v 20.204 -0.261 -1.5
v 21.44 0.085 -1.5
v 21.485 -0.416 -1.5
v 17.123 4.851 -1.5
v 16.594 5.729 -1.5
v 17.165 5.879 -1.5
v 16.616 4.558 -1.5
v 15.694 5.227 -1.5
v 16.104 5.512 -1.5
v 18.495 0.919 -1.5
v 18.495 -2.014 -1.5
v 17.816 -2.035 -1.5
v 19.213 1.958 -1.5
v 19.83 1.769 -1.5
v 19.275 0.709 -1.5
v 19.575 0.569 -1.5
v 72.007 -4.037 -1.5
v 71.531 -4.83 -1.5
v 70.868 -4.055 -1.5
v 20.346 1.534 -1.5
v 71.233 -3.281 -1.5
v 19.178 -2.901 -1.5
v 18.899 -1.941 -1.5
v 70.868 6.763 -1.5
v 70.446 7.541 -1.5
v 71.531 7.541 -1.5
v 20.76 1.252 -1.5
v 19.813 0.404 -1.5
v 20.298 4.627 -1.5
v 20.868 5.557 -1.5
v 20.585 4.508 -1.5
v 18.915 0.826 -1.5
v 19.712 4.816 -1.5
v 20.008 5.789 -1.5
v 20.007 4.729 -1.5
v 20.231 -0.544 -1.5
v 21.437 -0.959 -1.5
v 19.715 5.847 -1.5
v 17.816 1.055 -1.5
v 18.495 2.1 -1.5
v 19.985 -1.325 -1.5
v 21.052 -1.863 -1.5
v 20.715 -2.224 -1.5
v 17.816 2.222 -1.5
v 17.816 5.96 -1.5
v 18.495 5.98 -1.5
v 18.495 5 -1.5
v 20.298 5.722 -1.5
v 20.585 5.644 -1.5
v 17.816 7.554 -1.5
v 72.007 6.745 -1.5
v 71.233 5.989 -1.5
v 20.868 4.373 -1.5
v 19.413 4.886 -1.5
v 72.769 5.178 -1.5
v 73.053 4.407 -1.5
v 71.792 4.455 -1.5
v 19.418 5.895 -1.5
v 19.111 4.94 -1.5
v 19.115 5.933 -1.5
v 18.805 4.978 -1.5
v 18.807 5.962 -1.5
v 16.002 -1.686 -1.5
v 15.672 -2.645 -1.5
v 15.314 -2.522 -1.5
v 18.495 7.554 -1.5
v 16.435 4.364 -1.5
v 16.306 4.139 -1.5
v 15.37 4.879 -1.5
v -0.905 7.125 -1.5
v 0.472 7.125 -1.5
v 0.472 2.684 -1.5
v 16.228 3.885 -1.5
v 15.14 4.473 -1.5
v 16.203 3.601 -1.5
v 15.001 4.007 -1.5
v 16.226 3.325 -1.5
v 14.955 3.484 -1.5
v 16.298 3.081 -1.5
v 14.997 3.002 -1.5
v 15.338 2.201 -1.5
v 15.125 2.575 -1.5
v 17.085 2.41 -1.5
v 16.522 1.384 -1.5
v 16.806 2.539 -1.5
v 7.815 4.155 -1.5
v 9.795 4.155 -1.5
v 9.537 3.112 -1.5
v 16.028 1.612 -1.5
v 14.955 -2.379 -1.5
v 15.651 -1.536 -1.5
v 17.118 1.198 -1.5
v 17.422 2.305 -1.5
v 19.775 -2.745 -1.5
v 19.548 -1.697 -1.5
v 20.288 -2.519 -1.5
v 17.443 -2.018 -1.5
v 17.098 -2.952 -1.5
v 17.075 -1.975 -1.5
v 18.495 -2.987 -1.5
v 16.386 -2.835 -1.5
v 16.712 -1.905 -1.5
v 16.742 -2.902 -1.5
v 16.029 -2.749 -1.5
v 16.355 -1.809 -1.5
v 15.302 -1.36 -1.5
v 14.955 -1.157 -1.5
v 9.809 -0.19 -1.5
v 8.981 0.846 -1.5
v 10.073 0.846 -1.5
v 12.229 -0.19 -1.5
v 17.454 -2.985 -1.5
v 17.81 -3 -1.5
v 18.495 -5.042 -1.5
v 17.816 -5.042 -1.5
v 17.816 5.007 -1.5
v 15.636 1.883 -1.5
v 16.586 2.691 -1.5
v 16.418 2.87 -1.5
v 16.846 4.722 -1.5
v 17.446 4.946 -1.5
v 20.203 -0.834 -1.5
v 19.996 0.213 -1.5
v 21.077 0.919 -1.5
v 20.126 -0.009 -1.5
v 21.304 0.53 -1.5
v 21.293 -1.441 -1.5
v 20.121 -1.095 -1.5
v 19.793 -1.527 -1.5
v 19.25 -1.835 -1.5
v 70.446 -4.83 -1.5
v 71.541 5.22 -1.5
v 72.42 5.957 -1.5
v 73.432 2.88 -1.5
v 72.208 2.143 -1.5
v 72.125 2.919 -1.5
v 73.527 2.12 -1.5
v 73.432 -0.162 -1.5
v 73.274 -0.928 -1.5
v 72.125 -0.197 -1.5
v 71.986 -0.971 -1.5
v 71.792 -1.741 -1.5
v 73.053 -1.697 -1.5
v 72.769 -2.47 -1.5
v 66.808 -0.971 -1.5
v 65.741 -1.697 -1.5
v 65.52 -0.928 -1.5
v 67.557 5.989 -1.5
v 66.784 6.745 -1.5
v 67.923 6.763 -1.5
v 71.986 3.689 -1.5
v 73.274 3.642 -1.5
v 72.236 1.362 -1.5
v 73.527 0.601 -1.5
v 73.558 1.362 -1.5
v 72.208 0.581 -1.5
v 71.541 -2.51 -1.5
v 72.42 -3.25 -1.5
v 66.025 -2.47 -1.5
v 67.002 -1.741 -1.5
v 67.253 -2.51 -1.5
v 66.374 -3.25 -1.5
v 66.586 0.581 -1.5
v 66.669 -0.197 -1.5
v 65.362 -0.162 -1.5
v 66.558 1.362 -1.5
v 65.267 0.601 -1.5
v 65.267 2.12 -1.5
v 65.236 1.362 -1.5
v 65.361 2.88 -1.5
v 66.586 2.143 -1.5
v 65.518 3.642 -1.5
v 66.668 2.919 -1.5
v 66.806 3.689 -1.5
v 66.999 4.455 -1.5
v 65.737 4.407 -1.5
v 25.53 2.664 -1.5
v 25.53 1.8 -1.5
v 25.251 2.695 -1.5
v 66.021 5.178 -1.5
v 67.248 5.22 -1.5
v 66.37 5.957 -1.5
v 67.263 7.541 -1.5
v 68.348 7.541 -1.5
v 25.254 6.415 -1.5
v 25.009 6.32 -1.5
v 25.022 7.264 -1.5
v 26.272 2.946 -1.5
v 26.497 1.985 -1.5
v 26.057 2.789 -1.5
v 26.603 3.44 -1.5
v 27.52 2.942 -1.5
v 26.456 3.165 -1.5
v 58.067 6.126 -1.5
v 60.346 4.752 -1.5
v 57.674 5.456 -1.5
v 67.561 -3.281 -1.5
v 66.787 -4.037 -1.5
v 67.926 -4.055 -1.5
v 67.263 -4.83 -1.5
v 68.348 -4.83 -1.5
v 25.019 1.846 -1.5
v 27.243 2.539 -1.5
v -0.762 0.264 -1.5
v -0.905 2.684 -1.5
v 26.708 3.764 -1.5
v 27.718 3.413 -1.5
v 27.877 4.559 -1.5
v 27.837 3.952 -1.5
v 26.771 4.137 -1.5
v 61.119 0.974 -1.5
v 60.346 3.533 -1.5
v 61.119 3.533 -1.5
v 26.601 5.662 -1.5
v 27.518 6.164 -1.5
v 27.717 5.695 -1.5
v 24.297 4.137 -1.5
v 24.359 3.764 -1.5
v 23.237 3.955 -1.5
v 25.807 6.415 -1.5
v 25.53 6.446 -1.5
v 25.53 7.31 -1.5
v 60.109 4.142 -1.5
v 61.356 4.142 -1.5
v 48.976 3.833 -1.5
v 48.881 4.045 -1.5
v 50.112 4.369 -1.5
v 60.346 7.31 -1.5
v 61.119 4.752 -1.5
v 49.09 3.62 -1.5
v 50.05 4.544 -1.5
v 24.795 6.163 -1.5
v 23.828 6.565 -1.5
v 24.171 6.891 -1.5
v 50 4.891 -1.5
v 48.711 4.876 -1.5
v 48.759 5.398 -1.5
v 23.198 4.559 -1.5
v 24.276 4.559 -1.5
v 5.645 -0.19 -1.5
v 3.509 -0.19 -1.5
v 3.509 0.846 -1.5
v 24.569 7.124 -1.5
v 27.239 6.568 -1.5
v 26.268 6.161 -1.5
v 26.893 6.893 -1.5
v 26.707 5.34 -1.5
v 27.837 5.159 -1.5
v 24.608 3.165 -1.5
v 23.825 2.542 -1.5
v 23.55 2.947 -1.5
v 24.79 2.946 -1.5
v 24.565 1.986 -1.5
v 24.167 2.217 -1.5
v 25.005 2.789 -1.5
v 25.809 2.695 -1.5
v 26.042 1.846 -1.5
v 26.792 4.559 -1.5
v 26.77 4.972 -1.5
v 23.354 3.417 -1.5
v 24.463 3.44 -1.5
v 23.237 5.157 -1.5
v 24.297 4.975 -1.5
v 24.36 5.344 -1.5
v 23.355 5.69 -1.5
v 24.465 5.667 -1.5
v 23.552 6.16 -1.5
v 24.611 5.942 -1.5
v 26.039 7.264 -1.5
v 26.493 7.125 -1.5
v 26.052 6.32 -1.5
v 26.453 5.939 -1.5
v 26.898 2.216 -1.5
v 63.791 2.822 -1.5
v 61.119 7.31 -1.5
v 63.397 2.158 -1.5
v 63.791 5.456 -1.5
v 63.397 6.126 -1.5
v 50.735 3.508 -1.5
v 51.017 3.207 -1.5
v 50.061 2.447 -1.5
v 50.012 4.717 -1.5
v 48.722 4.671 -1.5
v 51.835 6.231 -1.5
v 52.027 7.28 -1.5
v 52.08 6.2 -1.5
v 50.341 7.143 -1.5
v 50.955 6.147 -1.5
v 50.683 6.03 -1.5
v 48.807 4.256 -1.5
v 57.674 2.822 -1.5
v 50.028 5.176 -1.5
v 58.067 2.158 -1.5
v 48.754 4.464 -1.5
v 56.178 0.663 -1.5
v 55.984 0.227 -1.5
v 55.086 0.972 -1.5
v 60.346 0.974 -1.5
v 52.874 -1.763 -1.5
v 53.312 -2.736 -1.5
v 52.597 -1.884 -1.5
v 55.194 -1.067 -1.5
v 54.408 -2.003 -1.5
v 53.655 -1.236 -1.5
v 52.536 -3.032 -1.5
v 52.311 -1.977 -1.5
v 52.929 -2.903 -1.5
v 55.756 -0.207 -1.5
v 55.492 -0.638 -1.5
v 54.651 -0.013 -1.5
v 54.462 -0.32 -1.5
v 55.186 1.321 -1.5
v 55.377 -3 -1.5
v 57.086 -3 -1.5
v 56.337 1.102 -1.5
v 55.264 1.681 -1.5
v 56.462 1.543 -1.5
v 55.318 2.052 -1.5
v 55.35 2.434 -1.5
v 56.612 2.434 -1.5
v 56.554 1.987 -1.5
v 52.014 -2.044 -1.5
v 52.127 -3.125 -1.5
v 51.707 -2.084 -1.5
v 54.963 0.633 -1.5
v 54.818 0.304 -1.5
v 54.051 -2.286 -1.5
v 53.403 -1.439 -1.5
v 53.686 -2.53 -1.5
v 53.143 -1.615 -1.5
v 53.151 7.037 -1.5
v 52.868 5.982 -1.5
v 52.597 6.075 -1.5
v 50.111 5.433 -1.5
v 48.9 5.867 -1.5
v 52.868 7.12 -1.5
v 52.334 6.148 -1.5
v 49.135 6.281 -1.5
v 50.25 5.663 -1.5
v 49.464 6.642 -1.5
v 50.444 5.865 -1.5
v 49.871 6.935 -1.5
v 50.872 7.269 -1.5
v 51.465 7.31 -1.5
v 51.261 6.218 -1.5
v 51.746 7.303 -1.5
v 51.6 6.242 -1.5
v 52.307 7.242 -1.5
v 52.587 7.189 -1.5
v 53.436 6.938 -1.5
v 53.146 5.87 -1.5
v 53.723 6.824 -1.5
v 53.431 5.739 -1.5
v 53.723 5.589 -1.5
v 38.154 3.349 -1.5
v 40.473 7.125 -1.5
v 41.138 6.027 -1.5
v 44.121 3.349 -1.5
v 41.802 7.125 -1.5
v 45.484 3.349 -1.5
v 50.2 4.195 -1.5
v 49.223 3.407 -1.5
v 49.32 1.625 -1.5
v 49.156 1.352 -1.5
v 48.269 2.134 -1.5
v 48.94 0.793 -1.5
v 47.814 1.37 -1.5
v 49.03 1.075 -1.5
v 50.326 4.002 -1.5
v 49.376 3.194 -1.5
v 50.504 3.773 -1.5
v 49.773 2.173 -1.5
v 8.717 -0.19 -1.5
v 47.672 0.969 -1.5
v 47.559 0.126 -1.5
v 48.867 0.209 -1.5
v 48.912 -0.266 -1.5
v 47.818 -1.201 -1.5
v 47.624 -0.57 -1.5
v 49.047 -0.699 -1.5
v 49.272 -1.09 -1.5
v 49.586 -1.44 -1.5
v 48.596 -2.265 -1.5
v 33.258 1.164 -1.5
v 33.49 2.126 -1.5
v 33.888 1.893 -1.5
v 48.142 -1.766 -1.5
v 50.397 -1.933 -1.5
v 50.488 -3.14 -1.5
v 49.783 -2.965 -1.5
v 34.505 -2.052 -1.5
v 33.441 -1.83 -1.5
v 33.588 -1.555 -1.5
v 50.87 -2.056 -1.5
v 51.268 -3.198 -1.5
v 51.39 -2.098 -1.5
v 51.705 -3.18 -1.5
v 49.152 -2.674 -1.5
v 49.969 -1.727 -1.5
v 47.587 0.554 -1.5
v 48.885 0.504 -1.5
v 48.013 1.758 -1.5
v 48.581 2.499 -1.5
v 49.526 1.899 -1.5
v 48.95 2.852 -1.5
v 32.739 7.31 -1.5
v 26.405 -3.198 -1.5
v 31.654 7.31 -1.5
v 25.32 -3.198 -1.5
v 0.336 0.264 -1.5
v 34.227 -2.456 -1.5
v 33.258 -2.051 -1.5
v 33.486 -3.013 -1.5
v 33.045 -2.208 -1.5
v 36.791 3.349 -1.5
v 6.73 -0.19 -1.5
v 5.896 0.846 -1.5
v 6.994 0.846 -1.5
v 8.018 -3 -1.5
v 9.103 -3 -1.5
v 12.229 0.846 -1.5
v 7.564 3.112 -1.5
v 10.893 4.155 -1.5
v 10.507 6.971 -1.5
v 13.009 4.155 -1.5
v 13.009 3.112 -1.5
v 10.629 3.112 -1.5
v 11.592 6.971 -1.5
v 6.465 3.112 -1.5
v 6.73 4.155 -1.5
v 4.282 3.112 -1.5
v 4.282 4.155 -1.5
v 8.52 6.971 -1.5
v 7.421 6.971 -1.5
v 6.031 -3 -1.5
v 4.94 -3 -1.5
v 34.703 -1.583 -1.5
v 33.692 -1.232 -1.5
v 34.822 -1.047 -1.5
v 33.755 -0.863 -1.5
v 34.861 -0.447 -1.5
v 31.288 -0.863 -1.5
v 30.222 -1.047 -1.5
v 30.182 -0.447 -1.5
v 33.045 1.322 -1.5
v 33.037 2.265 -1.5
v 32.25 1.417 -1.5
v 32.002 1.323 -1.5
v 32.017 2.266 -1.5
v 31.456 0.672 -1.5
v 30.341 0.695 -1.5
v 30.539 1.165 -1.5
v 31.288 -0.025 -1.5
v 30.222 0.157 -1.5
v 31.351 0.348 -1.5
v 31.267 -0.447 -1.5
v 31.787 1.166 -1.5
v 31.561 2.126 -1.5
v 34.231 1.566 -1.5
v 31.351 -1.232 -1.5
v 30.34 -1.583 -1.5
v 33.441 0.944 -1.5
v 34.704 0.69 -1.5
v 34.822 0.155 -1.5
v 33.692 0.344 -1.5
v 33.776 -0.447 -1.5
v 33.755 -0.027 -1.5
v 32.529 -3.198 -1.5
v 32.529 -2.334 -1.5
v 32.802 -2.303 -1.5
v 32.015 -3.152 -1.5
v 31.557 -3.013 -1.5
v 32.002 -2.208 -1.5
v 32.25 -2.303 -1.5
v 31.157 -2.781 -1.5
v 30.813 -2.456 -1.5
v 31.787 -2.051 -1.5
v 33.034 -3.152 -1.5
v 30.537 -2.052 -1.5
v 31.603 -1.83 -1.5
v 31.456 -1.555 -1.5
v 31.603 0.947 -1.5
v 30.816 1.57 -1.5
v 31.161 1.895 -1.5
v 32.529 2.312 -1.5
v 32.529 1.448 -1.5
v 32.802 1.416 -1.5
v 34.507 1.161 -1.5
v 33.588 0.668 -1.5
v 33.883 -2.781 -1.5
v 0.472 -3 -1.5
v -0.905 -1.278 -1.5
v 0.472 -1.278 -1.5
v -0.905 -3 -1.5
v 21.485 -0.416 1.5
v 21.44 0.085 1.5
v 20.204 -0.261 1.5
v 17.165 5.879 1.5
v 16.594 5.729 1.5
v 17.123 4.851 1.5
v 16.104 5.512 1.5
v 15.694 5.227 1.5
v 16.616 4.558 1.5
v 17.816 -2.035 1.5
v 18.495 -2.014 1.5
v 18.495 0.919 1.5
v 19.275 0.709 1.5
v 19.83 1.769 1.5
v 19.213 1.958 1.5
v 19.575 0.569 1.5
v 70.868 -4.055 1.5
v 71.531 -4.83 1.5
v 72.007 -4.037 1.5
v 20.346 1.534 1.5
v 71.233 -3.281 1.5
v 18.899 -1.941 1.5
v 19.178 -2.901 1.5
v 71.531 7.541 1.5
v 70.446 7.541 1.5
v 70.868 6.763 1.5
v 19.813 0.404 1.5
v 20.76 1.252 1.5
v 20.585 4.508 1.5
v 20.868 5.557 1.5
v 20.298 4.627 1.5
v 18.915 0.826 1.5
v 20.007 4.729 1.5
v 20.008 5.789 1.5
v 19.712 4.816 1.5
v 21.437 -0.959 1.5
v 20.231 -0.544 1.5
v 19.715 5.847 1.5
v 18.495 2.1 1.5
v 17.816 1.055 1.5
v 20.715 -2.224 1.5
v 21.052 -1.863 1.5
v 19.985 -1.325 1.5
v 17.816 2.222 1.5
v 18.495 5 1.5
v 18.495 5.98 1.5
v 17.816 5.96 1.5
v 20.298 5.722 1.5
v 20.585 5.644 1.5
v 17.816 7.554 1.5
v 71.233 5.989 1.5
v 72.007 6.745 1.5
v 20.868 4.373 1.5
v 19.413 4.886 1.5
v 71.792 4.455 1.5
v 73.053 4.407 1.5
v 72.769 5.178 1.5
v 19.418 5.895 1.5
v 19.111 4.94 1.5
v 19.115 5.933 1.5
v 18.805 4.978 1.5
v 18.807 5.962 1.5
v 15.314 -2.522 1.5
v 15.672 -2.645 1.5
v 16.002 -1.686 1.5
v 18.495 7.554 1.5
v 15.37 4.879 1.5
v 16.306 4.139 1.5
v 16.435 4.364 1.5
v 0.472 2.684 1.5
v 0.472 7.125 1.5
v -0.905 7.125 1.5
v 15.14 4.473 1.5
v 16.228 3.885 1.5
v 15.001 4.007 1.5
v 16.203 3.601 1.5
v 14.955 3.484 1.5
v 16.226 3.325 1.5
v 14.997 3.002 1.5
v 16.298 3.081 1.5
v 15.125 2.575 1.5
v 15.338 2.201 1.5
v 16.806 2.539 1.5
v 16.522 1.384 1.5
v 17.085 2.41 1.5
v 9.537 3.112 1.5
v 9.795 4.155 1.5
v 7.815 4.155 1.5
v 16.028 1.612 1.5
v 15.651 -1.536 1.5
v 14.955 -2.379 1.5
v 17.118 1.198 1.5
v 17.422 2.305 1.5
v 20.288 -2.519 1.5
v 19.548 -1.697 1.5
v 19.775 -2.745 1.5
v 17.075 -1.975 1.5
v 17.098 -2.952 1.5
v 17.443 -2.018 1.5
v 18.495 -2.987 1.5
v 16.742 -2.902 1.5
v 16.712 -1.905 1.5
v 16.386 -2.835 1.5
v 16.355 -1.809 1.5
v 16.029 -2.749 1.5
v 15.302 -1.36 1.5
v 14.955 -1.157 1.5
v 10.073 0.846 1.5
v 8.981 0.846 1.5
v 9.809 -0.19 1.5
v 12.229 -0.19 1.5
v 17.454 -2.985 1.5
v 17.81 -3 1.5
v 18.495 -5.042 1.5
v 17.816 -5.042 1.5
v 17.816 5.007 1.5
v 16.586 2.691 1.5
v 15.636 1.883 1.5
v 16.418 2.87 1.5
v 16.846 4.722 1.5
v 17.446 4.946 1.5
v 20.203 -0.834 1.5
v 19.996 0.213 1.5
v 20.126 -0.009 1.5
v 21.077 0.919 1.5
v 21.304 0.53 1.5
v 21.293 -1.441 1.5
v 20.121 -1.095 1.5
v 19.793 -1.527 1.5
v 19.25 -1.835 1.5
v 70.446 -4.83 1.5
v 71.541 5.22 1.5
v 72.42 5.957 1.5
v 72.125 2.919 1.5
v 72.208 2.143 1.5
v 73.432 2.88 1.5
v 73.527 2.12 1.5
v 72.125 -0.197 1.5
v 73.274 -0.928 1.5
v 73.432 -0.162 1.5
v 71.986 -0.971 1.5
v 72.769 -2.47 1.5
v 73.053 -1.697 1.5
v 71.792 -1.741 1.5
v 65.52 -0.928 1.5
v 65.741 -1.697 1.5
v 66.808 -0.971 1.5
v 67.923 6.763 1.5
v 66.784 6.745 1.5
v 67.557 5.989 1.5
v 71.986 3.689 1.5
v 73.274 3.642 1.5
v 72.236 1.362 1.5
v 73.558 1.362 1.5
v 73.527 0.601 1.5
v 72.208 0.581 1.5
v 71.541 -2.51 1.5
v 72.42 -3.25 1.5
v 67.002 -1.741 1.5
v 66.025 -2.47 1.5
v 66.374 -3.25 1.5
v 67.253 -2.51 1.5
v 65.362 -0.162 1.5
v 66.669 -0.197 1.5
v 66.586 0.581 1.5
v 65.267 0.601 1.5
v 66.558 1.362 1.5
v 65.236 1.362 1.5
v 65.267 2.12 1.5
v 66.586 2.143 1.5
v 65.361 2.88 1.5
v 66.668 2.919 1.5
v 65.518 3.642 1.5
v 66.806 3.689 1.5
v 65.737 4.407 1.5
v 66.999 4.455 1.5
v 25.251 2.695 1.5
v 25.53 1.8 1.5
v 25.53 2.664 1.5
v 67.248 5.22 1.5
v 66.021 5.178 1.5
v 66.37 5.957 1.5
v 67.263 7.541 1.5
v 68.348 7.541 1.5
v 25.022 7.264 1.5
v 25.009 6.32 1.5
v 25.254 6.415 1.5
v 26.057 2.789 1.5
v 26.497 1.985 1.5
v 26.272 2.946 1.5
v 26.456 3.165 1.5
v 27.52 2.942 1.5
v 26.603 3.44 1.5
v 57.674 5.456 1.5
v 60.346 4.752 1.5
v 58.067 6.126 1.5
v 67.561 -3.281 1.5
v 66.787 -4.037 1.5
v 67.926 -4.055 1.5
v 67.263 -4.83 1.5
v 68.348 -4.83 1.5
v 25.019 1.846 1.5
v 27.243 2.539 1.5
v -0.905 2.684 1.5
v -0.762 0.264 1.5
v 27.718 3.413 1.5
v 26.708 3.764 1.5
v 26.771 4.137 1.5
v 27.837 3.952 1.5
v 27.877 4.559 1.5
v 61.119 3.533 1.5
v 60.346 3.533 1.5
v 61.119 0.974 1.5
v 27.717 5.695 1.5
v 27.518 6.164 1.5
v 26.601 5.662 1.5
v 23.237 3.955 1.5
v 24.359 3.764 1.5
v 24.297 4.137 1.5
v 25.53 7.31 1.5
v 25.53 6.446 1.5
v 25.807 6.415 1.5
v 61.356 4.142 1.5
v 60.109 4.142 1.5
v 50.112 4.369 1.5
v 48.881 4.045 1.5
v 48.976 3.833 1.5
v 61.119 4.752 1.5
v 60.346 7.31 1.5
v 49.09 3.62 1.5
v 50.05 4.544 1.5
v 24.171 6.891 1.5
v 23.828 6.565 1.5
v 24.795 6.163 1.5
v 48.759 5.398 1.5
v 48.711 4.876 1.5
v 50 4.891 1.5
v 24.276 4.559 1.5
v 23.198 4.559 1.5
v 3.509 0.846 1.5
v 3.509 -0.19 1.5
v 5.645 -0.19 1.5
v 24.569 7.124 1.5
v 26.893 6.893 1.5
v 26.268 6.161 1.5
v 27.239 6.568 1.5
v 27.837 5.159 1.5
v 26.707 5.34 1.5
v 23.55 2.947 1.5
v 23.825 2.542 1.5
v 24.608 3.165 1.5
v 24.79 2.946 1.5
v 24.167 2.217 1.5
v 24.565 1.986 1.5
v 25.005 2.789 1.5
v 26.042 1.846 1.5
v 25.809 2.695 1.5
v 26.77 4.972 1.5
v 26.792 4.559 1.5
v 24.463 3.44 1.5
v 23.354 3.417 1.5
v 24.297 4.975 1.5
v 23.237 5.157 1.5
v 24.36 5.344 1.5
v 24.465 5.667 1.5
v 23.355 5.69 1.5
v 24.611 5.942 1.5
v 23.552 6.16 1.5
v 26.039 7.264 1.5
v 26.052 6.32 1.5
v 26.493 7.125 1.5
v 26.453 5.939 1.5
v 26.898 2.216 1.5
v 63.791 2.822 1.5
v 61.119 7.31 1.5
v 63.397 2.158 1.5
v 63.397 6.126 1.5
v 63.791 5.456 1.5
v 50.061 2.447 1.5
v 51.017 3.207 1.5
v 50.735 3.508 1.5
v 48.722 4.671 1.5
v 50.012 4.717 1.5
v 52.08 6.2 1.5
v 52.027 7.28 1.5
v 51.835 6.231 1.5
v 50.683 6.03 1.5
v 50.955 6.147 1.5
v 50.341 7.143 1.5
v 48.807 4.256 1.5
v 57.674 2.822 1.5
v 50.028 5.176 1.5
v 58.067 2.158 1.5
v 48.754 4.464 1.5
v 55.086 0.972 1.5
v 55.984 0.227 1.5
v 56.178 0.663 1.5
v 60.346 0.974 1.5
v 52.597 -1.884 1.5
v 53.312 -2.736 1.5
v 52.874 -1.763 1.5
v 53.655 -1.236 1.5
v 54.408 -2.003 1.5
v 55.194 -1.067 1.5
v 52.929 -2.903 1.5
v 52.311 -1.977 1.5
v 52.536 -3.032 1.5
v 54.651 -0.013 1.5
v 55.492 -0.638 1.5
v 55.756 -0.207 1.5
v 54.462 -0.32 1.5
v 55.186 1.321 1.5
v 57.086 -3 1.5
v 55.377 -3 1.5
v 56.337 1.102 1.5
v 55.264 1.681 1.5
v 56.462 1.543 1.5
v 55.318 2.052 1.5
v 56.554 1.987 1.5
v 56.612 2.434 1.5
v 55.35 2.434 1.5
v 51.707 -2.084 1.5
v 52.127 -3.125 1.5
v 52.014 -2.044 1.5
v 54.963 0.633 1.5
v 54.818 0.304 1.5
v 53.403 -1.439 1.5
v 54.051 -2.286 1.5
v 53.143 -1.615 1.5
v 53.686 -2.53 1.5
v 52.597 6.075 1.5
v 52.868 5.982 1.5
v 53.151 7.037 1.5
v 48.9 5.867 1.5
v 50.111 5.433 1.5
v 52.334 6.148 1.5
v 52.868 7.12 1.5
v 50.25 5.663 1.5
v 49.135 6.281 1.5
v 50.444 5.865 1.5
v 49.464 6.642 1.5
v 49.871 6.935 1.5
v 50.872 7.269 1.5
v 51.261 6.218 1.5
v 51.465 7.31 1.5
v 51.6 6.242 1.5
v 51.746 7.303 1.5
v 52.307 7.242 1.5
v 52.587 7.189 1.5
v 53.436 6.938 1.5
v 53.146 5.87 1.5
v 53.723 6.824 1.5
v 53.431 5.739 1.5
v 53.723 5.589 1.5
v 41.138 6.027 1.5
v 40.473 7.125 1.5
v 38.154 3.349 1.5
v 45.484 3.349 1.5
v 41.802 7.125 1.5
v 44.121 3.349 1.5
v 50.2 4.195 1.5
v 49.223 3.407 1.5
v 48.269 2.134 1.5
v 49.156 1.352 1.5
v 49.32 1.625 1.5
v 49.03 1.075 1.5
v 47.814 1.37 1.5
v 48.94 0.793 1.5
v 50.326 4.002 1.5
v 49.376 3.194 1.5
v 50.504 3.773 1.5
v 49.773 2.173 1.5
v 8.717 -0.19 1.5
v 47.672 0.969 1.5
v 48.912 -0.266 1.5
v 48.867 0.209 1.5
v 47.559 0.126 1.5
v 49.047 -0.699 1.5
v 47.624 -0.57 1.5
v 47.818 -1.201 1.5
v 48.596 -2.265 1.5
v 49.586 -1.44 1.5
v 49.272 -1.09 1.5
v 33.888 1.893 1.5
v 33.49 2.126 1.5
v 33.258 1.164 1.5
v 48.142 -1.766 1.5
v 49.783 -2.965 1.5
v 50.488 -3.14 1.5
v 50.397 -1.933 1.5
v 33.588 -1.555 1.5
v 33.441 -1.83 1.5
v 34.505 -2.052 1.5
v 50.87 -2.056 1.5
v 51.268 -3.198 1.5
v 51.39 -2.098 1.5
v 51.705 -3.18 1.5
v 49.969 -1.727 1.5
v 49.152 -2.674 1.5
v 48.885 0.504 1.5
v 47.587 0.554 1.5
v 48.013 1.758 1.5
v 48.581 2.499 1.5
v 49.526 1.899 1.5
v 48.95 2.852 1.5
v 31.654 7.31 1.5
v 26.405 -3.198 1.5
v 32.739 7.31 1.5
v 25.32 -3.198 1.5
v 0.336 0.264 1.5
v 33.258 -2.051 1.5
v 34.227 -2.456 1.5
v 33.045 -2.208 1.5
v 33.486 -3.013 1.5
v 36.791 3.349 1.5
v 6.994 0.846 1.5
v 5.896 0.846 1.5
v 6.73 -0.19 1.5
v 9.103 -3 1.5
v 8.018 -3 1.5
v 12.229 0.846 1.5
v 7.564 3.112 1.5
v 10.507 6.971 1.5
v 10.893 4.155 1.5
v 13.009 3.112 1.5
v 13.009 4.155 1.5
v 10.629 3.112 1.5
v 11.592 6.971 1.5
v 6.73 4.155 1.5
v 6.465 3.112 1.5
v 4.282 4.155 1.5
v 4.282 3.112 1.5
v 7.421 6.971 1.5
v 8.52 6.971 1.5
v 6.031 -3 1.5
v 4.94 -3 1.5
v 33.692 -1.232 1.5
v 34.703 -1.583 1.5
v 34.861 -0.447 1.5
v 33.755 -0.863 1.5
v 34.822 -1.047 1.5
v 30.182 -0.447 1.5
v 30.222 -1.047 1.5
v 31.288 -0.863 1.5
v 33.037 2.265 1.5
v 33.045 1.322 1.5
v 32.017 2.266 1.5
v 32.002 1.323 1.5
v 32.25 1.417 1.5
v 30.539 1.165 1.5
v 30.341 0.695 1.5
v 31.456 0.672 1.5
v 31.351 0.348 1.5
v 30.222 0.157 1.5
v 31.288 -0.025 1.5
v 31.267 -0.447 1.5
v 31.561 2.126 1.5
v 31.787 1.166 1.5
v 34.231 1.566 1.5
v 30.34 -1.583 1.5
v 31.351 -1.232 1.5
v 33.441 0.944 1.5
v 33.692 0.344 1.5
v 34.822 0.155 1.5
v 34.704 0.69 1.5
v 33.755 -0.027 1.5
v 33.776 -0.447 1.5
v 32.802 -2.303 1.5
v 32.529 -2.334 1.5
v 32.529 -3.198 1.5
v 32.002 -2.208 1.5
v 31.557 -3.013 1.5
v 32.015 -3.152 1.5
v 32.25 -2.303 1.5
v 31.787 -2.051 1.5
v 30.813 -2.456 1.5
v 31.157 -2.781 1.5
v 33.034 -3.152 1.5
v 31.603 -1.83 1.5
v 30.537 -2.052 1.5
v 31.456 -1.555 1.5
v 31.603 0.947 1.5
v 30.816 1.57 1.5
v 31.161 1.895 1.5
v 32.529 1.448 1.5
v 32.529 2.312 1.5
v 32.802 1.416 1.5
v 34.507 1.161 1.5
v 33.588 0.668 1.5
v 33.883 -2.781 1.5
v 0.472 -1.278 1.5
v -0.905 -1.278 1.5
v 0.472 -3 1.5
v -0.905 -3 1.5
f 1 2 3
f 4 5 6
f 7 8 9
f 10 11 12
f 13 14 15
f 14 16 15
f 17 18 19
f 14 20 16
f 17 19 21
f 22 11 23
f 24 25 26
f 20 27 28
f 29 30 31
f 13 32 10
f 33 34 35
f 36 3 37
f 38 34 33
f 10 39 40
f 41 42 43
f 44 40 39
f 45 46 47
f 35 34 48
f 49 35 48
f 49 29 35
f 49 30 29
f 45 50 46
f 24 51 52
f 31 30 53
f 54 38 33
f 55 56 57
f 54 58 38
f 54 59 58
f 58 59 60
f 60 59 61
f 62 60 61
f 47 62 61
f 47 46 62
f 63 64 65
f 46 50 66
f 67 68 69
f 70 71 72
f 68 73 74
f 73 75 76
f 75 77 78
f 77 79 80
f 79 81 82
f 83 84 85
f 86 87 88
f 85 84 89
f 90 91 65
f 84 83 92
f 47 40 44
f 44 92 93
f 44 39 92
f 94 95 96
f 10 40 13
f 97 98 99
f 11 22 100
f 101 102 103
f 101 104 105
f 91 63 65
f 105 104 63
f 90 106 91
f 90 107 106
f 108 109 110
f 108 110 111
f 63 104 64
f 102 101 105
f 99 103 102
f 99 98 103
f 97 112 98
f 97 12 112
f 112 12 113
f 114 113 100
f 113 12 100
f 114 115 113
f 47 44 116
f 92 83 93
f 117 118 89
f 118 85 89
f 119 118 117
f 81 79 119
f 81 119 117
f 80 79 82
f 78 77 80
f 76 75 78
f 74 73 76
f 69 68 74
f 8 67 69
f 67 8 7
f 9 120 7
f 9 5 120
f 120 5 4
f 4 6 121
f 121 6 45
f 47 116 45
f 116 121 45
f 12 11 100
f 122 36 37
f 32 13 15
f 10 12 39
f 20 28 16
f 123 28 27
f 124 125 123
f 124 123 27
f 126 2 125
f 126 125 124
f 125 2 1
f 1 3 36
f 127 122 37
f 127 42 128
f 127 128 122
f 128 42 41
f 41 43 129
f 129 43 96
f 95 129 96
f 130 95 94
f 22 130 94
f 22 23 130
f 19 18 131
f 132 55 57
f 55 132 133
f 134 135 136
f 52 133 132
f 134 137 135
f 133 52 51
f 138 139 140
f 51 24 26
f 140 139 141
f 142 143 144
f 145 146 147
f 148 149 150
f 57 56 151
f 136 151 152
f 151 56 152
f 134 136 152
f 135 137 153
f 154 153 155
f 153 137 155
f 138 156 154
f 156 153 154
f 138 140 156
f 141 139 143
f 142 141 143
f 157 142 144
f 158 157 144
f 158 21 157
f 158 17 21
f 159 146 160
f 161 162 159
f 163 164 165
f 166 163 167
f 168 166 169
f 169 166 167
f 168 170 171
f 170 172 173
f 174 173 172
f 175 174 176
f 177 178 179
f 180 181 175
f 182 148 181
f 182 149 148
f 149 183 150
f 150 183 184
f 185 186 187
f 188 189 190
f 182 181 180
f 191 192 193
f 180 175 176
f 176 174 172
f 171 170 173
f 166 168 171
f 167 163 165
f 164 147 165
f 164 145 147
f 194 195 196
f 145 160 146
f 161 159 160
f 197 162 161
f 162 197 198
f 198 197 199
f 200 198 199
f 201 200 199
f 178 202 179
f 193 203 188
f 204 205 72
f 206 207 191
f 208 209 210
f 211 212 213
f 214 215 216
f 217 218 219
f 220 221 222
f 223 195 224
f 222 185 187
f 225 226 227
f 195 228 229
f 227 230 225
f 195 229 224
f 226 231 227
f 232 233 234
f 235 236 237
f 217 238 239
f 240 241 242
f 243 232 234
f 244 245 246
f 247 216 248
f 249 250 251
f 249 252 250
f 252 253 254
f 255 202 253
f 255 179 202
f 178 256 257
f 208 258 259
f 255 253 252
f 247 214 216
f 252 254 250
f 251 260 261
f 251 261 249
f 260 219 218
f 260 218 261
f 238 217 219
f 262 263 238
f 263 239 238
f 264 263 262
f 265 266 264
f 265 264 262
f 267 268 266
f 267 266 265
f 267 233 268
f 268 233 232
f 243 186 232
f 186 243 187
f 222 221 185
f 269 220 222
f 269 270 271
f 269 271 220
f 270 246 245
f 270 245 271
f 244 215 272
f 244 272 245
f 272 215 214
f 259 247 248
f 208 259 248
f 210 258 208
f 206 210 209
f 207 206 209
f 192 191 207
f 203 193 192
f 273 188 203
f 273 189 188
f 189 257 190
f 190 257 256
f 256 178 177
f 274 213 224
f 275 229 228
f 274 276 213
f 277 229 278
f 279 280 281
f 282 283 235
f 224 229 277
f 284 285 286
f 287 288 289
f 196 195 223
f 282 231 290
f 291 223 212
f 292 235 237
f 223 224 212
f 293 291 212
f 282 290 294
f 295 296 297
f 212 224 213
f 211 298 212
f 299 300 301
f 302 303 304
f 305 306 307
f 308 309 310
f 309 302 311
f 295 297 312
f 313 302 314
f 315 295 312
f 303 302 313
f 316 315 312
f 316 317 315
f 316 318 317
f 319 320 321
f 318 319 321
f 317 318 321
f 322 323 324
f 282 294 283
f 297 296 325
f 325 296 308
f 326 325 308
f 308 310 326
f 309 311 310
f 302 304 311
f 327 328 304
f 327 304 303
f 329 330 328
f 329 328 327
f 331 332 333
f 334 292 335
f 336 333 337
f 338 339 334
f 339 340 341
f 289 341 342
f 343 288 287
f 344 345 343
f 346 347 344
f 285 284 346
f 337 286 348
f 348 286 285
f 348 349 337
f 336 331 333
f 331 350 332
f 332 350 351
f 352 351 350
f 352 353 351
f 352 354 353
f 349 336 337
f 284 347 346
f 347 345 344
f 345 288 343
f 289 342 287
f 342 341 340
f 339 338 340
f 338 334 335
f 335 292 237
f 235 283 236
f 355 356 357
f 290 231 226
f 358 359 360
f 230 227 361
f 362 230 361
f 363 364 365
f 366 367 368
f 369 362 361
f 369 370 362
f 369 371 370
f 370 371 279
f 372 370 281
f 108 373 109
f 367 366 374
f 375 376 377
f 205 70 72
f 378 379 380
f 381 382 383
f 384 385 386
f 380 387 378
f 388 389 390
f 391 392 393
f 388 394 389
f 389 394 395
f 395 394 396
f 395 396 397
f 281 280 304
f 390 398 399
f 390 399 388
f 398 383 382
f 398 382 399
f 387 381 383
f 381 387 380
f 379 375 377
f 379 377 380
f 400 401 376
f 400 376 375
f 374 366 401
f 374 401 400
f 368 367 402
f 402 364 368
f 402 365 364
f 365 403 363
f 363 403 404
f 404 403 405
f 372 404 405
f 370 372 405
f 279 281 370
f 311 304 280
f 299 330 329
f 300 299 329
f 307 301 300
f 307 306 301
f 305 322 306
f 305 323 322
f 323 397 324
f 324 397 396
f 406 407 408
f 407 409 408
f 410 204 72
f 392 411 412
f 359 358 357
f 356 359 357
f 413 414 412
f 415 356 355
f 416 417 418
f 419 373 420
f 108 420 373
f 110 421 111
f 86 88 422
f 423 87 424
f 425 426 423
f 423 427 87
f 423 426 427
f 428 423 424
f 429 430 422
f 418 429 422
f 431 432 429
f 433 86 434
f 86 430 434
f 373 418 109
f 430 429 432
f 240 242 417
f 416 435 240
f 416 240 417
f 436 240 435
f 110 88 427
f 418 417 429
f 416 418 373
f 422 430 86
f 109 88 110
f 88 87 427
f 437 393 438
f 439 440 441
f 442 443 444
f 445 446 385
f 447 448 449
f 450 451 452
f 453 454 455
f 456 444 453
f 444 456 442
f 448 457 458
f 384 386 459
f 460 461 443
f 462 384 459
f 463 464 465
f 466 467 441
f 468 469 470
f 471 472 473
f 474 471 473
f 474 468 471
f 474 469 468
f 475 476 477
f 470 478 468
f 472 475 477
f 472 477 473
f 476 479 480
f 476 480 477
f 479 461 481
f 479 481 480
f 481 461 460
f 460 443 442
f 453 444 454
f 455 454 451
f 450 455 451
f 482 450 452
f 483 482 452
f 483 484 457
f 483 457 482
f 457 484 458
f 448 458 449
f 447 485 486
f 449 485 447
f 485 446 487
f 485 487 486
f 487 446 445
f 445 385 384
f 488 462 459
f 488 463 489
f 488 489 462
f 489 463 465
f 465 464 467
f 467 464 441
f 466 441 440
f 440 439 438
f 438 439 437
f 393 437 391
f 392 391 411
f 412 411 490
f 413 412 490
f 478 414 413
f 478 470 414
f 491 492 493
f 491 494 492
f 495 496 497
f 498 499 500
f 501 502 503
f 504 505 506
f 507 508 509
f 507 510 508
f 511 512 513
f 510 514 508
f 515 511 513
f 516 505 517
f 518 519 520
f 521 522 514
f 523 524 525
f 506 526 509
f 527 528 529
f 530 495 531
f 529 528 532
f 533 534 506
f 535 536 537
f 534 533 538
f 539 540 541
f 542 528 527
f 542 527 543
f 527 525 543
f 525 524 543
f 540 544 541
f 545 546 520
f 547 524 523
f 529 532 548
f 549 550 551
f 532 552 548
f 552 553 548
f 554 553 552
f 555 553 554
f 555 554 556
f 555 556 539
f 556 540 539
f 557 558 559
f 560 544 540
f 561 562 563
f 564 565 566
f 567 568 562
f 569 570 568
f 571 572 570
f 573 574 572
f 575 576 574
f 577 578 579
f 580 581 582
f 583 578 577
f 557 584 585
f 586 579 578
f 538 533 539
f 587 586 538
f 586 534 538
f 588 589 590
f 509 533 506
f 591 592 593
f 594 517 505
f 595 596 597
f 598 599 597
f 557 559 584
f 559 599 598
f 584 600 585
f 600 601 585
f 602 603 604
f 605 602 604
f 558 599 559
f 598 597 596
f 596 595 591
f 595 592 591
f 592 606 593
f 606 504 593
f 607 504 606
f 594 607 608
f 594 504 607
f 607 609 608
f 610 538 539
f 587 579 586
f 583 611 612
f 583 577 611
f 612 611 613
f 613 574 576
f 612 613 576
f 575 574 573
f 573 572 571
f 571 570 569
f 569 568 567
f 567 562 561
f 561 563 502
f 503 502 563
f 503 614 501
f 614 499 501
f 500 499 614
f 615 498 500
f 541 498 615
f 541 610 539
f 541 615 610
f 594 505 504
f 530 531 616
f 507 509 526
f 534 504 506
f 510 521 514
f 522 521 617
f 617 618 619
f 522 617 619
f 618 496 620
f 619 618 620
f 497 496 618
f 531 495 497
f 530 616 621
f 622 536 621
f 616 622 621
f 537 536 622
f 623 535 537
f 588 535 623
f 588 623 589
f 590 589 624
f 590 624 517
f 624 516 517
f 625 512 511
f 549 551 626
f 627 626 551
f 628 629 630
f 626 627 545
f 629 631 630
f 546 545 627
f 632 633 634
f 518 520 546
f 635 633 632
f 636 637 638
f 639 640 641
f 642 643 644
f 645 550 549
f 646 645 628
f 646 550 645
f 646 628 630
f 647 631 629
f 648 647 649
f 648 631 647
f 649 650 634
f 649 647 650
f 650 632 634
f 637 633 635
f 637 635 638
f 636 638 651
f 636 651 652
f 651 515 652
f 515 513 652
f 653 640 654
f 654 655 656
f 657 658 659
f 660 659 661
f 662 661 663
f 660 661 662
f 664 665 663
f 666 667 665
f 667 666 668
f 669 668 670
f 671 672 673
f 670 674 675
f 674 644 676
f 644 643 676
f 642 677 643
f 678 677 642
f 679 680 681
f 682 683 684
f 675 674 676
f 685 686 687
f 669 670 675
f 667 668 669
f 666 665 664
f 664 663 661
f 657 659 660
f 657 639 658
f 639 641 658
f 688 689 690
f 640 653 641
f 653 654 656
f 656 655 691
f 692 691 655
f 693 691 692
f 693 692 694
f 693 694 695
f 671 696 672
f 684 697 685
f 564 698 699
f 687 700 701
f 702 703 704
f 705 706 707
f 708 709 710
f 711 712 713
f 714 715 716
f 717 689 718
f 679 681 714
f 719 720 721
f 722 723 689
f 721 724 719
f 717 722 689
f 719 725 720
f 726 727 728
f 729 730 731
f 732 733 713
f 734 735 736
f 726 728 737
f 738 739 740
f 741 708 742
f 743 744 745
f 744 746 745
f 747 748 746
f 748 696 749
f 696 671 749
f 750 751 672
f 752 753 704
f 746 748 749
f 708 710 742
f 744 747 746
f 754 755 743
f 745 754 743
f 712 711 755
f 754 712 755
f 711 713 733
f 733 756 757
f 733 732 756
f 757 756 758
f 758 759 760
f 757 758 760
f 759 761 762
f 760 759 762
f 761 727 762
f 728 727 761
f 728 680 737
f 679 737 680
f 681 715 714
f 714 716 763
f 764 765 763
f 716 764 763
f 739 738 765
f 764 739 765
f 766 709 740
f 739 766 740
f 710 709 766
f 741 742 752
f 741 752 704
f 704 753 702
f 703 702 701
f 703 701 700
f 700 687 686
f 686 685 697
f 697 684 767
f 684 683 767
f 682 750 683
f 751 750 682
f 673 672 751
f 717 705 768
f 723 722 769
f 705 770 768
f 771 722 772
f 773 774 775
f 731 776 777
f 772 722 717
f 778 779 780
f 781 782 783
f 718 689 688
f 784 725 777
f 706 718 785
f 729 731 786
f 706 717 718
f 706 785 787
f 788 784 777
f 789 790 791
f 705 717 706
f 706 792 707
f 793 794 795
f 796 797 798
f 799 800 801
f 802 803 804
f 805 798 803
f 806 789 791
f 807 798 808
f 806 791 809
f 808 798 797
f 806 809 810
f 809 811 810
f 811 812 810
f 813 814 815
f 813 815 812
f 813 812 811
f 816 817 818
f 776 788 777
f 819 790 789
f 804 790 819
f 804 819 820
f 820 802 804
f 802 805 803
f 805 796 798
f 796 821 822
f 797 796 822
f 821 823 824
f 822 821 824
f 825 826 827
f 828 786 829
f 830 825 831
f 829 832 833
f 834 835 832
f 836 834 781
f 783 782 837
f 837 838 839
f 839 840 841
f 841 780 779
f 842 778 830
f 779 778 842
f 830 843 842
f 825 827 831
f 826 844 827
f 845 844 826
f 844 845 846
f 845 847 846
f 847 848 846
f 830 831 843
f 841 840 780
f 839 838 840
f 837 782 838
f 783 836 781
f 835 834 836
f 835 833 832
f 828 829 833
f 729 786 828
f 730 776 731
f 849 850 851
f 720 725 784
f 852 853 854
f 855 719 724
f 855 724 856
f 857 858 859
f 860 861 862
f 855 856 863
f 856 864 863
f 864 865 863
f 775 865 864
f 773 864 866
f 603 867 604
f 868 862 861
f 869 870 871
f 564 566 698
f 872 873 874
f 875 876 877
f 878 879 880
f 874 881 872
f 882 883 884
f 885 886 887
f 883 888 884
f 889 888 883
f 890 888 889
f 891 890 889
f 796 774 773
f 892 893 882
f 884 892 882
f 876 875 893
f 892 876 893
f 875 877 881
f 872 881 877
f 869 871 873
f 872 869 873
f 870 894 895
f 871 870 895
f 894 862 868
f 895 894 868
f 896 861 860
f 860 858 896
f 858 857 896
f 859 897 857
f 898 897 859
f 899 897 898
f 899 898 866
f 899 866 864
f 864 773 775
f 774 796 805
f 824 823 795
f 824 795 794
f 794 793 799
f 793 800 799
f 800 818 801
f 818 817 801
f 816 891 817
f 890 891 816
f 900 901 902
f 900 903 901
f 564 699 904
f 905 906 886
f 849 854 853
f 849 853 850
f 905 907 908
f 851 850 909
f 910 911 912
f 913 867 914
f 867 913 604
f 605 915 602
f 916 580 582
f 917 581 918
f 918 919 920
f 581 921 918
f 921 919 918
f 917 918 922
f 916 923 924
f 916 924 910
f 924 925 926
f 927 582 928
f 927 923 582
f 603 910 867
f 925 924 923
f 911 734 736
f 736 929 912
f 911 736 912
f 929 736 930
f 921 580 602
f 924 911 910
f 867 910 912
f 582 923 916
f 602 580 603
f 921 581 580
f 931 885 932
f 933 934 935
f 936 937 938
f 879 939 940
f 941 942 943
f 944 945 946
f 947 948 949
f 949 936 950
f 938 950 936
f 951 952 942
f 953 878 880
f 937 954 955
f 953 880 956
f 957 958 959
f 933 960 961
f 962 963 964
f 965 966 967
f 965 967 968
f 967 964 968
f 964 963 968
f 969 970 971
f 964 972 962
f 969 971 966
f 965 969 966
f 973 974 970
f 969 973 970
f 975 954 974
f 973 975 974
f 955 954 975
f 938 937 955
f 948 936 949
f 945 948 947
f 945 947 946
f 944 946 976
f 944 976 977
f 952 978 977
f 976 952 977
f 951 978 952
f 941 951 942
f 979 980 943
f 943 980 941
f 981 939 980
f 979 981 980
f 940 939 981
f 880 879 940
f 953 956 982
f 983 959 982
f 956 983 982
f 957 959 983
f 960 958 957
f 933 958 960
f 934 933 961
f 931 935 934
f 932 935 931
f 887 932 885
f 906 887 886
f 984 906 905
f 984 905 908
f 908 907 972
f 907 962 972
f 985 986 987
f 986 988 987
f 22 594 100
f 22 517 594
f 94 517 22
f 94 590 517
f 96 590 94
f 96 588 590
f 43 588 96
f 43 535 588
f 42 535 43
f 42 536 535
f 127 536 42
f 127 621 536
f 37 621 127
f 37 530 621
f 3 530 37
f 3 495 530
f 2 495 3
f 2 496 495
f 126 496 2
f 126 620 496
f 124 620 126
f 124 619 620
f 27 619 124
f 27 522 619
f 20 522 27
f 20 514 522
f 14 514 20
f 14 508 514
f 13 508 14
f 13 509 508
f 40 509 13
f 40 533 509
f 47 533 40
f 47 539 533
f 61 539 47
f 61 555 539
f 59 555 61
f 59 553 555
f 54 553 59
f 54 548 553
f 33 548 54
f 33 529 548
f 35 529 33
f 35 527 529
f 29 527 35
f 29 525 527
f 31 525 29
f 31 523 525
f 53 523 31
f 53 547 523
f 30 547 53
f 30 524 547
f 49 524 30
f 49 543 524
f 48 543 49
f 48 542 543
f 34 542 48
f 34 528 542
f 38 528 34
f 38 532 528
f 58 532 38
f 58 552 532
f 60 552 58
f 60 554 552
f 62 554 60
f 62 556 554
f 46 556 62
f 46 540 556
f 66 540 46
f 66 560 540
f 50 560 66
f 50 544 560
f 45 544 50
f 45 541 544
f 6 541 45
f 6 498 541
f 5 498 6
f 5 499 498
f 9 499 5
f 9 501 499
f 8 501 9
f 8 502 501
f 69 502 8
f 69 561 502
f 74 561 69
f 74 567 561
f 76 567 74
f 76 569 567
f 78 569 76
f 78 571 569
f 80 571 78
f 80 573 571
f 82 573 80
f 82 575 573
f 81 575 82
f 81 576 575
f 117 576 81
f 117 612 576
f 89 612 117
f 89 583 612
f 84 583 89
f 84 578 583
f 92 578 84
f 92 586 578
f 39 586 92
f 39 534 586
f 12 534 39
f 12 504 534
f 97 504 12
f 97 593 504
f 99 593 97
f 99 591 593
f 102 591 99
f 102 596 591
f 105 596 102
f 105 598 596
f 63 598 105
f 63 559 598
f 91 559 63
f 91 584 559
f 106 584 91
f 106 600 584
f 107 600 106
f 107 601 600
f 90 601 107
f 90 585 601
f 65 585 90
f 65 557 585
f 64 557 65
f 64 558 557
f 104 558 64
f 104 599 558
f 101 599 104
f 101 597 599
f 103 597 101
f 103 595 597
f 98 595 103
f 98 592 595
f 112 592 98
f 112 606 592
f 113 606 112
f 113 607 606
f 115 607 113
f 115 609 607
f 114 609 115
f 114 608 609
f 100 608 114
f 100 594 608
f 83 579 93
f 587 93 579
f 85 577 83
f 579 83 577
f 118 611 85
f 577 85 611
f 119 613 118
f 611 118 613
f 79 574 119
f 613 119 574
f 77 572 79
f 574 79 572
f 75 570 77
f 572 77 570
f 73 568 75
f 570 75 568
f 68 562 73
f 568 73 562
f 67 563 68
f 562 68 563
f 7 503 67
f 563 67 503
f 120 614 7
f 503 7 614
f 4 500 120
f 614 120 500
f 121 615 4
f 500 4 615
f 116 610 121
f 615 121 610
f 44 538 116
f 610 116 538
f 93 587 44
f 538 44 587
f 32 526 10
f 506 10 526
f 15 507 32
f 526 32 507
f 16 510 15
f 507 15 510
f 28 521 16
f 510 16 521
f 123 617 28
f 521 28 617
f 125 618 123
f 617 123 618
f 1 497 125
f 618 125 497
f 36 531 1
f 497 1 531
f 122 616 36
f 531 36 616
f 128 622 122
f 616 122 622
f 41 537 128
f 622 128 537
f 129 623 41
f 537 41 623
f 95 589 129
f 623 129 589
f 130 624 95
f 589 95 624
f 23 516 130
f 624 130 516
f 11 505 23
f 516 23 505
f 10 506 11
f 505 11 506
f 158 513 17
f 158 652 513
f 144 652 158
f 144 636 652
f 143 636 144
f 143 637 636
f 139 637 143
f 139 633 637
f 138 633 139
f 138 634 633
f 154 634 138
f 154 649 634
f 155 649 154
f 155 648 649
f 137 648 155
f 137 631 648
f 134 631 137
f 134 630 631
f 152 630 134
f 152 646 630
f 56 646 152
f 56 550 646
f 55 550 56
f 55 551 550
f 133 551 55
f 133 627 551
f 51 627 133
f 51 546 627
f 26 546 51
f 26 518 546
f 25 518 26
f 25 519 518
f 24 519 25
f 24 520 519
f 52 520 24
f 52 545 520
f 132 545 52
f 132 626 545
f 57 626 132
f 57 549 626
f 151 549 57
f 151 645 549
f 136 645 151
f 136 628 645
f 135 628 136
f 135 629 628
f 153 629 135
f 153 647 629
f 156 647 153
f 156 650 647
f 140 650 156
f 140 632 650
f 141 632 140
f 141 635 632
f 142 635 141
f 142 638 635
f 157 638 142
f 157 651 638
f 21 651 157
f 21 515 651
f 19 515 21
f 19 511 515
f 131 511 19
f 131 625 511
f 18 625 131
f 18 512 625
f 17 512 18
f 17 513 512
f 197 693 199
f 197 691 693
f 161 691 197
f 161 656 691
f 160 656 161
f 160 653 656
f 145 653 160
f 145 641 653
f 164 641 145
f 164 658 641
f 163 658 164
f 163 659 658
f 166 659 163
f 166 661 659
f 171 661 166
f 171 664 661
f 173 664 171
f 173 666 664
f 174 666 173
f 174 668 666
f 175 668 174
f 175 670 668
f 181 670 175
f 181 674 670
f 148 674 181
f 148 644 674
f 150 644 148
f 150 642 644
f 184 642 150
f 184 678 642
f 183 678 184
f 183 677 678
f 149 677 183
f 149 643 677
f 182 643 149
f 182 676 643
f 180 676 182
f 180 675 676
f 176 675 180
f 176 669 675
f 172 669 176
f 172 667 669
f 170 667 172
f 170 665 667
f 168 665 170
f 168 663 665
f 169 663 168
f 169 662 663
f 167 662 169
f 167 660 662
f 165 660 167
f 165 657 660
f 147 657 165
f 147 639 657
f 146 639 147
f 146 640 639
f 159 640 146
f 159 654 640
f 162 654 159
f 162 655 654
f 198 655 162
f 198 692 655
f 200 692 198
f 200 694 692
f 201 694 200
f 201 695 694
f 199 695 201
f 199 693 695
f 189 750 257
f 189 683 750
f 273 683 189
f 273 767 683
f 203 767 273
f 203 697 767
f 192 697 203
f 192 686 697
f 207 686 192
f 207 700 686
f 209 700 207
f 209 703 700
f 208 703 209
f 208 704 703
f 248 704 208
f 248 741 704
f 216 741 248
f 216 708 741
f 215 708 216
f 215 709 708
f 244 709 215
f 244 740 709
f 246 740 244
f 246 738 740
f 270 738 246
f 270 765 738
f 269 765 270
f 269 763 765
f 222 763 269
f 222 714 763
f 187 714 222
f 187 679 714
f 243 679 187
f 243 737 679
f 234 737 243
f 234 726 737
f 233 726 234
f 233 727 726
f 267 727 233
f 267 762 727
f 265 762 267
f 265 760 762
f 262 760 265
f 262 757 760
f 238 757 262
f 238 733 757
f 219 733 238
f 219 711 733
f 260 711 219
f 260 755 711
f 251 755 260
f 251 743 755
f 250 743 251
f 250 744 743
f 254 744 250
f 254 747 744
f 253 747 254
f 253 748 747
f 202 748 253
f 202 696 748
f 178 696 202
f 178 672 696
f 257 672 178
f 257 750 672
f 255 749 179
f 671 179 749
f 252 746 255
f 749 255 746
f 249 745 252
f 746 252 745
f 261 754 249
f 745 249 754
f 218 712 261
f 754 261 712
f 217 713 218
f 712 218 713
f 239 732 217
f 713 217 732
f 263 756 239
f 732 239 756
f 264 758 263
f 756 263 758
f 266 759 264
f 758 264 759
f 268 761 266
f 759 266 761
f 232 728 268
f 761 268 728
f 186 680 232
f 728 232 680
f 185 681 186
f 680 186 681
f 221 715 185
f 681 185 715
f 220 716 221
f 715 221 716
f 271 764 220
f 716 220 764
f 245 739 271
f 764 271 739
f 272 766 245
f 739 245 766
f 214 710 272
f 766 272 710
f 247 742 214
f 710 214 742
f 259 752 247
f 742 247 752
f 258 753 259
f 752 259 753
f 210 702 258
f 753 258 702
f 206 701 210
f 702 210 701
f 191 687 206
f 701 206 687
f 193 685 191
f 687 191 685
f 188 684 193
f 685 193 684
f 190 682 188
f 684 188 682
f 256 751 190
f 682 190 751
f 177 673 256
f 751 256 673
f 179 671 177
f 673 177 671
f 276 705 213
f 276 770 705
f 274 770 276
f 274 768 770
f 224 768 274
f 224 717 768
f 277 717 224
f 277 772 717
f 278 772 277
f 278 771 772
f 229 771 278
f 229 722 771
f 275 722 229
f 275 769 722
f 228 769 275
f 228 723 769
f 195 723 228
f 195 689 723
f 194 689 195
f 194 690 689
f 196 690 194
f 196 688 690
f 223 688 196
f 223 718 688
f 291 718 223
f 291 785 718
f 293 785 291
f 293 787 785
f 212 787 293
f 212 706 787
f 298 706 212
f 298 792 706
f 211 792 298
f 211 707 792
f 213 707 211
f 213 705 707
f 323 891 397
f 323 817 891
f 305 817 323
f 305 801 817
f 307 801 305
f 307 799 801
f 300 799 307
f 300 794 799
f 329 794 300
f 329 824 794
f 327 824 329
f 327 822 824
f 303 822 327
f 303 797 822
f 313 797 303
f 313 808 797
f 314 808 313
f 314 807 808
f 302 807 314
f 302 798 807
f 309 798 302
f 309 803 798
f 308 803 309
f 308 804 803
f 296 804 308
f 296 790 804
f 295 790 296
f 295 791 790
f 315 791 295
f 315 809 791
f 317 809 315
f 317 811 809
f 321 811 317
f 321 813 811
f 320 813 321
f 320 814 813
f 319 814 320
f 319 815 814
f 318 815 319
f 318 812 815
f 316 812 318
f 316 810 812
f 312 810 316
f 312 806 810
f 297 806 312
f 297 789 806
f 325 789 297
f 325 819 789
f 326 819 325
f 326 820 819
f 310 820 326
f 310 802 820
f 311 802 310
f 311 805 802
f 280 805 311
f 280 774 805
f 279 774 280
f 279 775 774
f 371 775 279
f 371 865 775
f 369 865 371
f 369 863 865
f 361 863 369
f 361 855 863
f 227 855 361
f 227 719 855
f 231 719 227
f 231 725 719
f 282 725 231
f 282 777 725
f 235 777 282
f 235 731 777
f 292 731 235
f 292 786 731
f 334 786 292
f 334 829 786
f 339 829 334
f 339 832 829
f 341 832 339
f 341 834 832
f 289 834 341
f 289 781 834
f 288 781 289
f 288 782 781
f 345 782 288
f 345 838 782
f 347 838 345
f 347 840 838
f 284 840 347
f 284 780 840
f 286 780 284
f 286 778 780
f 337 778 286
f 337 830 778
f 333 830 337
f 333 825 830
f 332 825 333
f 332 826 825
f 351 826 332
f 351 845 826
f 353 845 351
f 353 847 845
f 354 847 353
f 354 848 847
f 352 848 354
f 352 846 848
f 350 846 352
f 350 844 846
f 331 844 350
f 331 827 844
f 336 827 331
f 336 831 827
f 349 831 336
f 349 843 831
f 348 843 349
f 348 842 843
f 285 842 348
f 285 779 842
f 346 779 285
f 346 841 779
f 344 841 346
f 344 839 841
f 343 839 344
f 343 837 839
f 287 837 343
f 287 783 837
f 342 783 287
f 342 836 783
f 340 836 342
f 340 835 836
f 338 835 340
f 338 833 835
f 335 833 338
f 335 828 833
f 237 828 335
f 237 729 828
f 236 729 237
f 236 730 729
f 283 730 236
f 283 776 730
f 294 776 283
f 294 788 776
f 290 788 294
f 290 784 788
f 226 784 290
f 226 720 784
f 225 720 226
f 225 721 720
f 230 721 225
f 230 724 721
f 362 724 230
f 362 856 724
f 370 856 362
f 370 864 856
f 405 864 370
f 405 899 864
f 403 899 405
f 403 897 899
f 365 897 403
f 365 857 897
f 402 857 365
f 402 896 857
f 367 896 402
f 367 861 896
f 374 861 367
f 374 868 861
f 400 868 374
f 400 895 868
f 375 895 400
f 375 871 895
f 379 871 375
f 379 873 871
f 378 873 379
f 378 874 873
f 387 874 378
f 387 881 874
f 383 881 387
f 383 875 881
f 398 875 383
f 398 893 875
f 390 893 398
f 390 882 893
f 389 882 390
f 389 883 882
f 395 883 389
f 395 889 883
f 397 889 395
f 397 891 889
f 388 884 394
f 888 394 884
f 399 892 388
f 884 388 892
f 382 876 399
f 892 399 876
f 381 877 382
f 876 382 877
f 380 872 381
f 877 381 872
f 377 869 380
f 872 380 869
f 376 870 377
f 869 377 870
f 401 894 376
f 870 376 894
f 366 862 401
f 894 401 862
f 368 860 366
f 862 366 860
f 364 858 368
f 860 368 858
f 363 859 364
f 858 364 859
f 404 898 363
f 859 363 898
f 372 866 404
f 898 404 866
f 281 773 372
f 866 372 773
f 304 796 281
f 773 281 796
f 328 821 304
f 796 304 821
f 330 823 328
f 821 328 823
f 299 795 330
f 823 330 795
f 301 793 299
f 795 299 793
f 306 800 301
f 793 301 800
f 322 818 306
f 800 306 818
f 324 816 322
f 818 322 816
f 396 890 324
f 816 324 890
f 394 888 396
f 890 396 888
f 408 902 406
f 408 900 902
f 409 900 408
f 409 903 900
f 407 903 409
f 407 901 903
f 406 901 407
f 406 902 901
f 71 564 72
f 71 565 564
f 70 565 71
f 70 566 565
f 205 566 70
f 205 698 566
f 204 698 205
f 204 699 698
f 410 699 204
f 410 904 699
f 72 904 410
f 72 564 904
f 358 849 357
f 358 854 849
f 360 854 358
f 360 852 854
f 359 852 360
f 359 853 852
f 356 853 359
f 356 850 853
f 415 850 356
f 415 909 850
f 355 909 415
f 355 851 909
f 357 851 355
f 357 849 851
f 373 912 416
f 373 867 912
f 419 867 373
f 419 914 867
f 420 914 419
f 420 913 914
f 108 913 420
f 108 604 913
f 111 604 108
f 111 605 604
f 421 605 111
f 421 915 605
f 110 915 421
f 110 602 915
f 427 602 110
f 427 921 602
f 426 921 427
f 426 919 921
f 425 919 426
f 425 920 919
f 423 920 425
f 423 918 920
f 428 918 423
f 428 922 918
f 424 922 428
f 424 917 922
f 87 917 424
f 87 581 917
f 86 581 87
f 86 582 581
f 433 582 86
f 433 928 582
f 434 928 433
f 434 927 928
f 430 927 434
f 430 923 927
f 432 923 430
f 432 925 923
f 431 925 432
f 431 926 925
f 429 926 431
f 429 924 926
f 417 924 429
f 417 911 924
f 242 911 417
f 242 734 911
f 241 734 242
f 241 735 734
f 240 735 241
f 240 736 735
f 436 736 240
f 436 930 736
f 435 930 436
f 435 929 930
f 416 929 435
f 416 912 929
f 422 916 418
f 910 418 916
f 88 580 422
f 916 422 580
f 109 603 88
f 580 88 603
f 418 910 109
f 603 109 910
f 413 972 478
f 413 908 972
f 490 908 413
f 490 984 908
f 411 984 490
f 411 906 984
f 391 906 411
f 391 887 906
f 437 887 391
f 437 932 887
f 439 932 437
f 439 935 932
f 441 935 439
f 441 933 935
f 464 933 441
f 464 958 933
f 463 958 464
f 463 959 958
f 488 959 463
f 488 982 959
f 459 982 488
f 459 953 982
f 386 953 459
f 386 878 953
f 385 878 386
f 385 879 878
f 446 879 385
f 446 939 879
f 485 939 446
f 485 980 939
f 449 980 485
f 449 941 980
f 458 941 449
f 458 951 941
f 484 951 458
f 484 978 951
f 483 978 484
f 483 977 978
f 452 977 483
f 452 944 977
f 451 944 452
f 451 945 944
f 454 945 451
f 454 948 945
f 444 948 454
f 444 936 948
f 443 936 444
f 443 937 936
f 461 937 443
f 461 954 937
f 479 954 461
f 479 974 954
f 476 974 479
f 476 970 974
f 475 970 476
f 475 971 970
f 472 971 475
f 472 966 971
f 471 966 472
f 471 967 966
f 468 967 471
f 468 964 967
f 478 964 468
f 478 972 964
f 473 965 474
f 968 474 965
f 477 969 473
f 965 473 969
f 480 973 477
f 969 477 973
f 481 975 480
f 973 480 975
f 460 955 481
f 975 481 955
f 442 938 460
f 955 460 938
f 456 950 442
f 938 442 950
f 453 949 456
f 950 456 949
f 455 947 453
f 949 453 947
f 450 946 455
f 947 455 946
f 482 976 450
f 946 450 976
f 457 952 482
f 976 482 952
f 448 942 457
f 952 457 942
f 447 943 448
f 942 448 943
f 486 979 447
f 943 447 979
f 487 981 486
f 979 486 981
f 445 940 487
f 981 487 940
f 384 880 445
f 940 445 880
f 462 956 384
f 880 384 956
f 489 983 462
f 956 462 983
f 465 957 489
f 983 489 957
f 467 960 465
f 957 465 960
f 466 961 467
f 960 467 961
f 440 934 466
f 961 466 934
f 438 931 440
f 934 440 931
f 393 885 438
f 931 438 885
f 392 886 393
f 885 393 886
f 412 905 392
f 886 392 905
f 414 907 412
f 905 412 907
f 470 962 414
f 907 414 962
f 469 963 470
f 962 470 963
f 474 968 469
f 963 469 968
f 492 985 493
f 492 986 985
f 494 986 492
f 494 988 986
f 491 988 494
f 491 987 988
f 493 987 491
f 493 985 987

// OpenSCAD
content = "!#$%^&*()";
font = "Webdings";

linear_extrude(height = 3,center=true, twist=0) {
       translate([-3,-3,0]) text(content, font = font, spacing= 1, size = 10);
}
